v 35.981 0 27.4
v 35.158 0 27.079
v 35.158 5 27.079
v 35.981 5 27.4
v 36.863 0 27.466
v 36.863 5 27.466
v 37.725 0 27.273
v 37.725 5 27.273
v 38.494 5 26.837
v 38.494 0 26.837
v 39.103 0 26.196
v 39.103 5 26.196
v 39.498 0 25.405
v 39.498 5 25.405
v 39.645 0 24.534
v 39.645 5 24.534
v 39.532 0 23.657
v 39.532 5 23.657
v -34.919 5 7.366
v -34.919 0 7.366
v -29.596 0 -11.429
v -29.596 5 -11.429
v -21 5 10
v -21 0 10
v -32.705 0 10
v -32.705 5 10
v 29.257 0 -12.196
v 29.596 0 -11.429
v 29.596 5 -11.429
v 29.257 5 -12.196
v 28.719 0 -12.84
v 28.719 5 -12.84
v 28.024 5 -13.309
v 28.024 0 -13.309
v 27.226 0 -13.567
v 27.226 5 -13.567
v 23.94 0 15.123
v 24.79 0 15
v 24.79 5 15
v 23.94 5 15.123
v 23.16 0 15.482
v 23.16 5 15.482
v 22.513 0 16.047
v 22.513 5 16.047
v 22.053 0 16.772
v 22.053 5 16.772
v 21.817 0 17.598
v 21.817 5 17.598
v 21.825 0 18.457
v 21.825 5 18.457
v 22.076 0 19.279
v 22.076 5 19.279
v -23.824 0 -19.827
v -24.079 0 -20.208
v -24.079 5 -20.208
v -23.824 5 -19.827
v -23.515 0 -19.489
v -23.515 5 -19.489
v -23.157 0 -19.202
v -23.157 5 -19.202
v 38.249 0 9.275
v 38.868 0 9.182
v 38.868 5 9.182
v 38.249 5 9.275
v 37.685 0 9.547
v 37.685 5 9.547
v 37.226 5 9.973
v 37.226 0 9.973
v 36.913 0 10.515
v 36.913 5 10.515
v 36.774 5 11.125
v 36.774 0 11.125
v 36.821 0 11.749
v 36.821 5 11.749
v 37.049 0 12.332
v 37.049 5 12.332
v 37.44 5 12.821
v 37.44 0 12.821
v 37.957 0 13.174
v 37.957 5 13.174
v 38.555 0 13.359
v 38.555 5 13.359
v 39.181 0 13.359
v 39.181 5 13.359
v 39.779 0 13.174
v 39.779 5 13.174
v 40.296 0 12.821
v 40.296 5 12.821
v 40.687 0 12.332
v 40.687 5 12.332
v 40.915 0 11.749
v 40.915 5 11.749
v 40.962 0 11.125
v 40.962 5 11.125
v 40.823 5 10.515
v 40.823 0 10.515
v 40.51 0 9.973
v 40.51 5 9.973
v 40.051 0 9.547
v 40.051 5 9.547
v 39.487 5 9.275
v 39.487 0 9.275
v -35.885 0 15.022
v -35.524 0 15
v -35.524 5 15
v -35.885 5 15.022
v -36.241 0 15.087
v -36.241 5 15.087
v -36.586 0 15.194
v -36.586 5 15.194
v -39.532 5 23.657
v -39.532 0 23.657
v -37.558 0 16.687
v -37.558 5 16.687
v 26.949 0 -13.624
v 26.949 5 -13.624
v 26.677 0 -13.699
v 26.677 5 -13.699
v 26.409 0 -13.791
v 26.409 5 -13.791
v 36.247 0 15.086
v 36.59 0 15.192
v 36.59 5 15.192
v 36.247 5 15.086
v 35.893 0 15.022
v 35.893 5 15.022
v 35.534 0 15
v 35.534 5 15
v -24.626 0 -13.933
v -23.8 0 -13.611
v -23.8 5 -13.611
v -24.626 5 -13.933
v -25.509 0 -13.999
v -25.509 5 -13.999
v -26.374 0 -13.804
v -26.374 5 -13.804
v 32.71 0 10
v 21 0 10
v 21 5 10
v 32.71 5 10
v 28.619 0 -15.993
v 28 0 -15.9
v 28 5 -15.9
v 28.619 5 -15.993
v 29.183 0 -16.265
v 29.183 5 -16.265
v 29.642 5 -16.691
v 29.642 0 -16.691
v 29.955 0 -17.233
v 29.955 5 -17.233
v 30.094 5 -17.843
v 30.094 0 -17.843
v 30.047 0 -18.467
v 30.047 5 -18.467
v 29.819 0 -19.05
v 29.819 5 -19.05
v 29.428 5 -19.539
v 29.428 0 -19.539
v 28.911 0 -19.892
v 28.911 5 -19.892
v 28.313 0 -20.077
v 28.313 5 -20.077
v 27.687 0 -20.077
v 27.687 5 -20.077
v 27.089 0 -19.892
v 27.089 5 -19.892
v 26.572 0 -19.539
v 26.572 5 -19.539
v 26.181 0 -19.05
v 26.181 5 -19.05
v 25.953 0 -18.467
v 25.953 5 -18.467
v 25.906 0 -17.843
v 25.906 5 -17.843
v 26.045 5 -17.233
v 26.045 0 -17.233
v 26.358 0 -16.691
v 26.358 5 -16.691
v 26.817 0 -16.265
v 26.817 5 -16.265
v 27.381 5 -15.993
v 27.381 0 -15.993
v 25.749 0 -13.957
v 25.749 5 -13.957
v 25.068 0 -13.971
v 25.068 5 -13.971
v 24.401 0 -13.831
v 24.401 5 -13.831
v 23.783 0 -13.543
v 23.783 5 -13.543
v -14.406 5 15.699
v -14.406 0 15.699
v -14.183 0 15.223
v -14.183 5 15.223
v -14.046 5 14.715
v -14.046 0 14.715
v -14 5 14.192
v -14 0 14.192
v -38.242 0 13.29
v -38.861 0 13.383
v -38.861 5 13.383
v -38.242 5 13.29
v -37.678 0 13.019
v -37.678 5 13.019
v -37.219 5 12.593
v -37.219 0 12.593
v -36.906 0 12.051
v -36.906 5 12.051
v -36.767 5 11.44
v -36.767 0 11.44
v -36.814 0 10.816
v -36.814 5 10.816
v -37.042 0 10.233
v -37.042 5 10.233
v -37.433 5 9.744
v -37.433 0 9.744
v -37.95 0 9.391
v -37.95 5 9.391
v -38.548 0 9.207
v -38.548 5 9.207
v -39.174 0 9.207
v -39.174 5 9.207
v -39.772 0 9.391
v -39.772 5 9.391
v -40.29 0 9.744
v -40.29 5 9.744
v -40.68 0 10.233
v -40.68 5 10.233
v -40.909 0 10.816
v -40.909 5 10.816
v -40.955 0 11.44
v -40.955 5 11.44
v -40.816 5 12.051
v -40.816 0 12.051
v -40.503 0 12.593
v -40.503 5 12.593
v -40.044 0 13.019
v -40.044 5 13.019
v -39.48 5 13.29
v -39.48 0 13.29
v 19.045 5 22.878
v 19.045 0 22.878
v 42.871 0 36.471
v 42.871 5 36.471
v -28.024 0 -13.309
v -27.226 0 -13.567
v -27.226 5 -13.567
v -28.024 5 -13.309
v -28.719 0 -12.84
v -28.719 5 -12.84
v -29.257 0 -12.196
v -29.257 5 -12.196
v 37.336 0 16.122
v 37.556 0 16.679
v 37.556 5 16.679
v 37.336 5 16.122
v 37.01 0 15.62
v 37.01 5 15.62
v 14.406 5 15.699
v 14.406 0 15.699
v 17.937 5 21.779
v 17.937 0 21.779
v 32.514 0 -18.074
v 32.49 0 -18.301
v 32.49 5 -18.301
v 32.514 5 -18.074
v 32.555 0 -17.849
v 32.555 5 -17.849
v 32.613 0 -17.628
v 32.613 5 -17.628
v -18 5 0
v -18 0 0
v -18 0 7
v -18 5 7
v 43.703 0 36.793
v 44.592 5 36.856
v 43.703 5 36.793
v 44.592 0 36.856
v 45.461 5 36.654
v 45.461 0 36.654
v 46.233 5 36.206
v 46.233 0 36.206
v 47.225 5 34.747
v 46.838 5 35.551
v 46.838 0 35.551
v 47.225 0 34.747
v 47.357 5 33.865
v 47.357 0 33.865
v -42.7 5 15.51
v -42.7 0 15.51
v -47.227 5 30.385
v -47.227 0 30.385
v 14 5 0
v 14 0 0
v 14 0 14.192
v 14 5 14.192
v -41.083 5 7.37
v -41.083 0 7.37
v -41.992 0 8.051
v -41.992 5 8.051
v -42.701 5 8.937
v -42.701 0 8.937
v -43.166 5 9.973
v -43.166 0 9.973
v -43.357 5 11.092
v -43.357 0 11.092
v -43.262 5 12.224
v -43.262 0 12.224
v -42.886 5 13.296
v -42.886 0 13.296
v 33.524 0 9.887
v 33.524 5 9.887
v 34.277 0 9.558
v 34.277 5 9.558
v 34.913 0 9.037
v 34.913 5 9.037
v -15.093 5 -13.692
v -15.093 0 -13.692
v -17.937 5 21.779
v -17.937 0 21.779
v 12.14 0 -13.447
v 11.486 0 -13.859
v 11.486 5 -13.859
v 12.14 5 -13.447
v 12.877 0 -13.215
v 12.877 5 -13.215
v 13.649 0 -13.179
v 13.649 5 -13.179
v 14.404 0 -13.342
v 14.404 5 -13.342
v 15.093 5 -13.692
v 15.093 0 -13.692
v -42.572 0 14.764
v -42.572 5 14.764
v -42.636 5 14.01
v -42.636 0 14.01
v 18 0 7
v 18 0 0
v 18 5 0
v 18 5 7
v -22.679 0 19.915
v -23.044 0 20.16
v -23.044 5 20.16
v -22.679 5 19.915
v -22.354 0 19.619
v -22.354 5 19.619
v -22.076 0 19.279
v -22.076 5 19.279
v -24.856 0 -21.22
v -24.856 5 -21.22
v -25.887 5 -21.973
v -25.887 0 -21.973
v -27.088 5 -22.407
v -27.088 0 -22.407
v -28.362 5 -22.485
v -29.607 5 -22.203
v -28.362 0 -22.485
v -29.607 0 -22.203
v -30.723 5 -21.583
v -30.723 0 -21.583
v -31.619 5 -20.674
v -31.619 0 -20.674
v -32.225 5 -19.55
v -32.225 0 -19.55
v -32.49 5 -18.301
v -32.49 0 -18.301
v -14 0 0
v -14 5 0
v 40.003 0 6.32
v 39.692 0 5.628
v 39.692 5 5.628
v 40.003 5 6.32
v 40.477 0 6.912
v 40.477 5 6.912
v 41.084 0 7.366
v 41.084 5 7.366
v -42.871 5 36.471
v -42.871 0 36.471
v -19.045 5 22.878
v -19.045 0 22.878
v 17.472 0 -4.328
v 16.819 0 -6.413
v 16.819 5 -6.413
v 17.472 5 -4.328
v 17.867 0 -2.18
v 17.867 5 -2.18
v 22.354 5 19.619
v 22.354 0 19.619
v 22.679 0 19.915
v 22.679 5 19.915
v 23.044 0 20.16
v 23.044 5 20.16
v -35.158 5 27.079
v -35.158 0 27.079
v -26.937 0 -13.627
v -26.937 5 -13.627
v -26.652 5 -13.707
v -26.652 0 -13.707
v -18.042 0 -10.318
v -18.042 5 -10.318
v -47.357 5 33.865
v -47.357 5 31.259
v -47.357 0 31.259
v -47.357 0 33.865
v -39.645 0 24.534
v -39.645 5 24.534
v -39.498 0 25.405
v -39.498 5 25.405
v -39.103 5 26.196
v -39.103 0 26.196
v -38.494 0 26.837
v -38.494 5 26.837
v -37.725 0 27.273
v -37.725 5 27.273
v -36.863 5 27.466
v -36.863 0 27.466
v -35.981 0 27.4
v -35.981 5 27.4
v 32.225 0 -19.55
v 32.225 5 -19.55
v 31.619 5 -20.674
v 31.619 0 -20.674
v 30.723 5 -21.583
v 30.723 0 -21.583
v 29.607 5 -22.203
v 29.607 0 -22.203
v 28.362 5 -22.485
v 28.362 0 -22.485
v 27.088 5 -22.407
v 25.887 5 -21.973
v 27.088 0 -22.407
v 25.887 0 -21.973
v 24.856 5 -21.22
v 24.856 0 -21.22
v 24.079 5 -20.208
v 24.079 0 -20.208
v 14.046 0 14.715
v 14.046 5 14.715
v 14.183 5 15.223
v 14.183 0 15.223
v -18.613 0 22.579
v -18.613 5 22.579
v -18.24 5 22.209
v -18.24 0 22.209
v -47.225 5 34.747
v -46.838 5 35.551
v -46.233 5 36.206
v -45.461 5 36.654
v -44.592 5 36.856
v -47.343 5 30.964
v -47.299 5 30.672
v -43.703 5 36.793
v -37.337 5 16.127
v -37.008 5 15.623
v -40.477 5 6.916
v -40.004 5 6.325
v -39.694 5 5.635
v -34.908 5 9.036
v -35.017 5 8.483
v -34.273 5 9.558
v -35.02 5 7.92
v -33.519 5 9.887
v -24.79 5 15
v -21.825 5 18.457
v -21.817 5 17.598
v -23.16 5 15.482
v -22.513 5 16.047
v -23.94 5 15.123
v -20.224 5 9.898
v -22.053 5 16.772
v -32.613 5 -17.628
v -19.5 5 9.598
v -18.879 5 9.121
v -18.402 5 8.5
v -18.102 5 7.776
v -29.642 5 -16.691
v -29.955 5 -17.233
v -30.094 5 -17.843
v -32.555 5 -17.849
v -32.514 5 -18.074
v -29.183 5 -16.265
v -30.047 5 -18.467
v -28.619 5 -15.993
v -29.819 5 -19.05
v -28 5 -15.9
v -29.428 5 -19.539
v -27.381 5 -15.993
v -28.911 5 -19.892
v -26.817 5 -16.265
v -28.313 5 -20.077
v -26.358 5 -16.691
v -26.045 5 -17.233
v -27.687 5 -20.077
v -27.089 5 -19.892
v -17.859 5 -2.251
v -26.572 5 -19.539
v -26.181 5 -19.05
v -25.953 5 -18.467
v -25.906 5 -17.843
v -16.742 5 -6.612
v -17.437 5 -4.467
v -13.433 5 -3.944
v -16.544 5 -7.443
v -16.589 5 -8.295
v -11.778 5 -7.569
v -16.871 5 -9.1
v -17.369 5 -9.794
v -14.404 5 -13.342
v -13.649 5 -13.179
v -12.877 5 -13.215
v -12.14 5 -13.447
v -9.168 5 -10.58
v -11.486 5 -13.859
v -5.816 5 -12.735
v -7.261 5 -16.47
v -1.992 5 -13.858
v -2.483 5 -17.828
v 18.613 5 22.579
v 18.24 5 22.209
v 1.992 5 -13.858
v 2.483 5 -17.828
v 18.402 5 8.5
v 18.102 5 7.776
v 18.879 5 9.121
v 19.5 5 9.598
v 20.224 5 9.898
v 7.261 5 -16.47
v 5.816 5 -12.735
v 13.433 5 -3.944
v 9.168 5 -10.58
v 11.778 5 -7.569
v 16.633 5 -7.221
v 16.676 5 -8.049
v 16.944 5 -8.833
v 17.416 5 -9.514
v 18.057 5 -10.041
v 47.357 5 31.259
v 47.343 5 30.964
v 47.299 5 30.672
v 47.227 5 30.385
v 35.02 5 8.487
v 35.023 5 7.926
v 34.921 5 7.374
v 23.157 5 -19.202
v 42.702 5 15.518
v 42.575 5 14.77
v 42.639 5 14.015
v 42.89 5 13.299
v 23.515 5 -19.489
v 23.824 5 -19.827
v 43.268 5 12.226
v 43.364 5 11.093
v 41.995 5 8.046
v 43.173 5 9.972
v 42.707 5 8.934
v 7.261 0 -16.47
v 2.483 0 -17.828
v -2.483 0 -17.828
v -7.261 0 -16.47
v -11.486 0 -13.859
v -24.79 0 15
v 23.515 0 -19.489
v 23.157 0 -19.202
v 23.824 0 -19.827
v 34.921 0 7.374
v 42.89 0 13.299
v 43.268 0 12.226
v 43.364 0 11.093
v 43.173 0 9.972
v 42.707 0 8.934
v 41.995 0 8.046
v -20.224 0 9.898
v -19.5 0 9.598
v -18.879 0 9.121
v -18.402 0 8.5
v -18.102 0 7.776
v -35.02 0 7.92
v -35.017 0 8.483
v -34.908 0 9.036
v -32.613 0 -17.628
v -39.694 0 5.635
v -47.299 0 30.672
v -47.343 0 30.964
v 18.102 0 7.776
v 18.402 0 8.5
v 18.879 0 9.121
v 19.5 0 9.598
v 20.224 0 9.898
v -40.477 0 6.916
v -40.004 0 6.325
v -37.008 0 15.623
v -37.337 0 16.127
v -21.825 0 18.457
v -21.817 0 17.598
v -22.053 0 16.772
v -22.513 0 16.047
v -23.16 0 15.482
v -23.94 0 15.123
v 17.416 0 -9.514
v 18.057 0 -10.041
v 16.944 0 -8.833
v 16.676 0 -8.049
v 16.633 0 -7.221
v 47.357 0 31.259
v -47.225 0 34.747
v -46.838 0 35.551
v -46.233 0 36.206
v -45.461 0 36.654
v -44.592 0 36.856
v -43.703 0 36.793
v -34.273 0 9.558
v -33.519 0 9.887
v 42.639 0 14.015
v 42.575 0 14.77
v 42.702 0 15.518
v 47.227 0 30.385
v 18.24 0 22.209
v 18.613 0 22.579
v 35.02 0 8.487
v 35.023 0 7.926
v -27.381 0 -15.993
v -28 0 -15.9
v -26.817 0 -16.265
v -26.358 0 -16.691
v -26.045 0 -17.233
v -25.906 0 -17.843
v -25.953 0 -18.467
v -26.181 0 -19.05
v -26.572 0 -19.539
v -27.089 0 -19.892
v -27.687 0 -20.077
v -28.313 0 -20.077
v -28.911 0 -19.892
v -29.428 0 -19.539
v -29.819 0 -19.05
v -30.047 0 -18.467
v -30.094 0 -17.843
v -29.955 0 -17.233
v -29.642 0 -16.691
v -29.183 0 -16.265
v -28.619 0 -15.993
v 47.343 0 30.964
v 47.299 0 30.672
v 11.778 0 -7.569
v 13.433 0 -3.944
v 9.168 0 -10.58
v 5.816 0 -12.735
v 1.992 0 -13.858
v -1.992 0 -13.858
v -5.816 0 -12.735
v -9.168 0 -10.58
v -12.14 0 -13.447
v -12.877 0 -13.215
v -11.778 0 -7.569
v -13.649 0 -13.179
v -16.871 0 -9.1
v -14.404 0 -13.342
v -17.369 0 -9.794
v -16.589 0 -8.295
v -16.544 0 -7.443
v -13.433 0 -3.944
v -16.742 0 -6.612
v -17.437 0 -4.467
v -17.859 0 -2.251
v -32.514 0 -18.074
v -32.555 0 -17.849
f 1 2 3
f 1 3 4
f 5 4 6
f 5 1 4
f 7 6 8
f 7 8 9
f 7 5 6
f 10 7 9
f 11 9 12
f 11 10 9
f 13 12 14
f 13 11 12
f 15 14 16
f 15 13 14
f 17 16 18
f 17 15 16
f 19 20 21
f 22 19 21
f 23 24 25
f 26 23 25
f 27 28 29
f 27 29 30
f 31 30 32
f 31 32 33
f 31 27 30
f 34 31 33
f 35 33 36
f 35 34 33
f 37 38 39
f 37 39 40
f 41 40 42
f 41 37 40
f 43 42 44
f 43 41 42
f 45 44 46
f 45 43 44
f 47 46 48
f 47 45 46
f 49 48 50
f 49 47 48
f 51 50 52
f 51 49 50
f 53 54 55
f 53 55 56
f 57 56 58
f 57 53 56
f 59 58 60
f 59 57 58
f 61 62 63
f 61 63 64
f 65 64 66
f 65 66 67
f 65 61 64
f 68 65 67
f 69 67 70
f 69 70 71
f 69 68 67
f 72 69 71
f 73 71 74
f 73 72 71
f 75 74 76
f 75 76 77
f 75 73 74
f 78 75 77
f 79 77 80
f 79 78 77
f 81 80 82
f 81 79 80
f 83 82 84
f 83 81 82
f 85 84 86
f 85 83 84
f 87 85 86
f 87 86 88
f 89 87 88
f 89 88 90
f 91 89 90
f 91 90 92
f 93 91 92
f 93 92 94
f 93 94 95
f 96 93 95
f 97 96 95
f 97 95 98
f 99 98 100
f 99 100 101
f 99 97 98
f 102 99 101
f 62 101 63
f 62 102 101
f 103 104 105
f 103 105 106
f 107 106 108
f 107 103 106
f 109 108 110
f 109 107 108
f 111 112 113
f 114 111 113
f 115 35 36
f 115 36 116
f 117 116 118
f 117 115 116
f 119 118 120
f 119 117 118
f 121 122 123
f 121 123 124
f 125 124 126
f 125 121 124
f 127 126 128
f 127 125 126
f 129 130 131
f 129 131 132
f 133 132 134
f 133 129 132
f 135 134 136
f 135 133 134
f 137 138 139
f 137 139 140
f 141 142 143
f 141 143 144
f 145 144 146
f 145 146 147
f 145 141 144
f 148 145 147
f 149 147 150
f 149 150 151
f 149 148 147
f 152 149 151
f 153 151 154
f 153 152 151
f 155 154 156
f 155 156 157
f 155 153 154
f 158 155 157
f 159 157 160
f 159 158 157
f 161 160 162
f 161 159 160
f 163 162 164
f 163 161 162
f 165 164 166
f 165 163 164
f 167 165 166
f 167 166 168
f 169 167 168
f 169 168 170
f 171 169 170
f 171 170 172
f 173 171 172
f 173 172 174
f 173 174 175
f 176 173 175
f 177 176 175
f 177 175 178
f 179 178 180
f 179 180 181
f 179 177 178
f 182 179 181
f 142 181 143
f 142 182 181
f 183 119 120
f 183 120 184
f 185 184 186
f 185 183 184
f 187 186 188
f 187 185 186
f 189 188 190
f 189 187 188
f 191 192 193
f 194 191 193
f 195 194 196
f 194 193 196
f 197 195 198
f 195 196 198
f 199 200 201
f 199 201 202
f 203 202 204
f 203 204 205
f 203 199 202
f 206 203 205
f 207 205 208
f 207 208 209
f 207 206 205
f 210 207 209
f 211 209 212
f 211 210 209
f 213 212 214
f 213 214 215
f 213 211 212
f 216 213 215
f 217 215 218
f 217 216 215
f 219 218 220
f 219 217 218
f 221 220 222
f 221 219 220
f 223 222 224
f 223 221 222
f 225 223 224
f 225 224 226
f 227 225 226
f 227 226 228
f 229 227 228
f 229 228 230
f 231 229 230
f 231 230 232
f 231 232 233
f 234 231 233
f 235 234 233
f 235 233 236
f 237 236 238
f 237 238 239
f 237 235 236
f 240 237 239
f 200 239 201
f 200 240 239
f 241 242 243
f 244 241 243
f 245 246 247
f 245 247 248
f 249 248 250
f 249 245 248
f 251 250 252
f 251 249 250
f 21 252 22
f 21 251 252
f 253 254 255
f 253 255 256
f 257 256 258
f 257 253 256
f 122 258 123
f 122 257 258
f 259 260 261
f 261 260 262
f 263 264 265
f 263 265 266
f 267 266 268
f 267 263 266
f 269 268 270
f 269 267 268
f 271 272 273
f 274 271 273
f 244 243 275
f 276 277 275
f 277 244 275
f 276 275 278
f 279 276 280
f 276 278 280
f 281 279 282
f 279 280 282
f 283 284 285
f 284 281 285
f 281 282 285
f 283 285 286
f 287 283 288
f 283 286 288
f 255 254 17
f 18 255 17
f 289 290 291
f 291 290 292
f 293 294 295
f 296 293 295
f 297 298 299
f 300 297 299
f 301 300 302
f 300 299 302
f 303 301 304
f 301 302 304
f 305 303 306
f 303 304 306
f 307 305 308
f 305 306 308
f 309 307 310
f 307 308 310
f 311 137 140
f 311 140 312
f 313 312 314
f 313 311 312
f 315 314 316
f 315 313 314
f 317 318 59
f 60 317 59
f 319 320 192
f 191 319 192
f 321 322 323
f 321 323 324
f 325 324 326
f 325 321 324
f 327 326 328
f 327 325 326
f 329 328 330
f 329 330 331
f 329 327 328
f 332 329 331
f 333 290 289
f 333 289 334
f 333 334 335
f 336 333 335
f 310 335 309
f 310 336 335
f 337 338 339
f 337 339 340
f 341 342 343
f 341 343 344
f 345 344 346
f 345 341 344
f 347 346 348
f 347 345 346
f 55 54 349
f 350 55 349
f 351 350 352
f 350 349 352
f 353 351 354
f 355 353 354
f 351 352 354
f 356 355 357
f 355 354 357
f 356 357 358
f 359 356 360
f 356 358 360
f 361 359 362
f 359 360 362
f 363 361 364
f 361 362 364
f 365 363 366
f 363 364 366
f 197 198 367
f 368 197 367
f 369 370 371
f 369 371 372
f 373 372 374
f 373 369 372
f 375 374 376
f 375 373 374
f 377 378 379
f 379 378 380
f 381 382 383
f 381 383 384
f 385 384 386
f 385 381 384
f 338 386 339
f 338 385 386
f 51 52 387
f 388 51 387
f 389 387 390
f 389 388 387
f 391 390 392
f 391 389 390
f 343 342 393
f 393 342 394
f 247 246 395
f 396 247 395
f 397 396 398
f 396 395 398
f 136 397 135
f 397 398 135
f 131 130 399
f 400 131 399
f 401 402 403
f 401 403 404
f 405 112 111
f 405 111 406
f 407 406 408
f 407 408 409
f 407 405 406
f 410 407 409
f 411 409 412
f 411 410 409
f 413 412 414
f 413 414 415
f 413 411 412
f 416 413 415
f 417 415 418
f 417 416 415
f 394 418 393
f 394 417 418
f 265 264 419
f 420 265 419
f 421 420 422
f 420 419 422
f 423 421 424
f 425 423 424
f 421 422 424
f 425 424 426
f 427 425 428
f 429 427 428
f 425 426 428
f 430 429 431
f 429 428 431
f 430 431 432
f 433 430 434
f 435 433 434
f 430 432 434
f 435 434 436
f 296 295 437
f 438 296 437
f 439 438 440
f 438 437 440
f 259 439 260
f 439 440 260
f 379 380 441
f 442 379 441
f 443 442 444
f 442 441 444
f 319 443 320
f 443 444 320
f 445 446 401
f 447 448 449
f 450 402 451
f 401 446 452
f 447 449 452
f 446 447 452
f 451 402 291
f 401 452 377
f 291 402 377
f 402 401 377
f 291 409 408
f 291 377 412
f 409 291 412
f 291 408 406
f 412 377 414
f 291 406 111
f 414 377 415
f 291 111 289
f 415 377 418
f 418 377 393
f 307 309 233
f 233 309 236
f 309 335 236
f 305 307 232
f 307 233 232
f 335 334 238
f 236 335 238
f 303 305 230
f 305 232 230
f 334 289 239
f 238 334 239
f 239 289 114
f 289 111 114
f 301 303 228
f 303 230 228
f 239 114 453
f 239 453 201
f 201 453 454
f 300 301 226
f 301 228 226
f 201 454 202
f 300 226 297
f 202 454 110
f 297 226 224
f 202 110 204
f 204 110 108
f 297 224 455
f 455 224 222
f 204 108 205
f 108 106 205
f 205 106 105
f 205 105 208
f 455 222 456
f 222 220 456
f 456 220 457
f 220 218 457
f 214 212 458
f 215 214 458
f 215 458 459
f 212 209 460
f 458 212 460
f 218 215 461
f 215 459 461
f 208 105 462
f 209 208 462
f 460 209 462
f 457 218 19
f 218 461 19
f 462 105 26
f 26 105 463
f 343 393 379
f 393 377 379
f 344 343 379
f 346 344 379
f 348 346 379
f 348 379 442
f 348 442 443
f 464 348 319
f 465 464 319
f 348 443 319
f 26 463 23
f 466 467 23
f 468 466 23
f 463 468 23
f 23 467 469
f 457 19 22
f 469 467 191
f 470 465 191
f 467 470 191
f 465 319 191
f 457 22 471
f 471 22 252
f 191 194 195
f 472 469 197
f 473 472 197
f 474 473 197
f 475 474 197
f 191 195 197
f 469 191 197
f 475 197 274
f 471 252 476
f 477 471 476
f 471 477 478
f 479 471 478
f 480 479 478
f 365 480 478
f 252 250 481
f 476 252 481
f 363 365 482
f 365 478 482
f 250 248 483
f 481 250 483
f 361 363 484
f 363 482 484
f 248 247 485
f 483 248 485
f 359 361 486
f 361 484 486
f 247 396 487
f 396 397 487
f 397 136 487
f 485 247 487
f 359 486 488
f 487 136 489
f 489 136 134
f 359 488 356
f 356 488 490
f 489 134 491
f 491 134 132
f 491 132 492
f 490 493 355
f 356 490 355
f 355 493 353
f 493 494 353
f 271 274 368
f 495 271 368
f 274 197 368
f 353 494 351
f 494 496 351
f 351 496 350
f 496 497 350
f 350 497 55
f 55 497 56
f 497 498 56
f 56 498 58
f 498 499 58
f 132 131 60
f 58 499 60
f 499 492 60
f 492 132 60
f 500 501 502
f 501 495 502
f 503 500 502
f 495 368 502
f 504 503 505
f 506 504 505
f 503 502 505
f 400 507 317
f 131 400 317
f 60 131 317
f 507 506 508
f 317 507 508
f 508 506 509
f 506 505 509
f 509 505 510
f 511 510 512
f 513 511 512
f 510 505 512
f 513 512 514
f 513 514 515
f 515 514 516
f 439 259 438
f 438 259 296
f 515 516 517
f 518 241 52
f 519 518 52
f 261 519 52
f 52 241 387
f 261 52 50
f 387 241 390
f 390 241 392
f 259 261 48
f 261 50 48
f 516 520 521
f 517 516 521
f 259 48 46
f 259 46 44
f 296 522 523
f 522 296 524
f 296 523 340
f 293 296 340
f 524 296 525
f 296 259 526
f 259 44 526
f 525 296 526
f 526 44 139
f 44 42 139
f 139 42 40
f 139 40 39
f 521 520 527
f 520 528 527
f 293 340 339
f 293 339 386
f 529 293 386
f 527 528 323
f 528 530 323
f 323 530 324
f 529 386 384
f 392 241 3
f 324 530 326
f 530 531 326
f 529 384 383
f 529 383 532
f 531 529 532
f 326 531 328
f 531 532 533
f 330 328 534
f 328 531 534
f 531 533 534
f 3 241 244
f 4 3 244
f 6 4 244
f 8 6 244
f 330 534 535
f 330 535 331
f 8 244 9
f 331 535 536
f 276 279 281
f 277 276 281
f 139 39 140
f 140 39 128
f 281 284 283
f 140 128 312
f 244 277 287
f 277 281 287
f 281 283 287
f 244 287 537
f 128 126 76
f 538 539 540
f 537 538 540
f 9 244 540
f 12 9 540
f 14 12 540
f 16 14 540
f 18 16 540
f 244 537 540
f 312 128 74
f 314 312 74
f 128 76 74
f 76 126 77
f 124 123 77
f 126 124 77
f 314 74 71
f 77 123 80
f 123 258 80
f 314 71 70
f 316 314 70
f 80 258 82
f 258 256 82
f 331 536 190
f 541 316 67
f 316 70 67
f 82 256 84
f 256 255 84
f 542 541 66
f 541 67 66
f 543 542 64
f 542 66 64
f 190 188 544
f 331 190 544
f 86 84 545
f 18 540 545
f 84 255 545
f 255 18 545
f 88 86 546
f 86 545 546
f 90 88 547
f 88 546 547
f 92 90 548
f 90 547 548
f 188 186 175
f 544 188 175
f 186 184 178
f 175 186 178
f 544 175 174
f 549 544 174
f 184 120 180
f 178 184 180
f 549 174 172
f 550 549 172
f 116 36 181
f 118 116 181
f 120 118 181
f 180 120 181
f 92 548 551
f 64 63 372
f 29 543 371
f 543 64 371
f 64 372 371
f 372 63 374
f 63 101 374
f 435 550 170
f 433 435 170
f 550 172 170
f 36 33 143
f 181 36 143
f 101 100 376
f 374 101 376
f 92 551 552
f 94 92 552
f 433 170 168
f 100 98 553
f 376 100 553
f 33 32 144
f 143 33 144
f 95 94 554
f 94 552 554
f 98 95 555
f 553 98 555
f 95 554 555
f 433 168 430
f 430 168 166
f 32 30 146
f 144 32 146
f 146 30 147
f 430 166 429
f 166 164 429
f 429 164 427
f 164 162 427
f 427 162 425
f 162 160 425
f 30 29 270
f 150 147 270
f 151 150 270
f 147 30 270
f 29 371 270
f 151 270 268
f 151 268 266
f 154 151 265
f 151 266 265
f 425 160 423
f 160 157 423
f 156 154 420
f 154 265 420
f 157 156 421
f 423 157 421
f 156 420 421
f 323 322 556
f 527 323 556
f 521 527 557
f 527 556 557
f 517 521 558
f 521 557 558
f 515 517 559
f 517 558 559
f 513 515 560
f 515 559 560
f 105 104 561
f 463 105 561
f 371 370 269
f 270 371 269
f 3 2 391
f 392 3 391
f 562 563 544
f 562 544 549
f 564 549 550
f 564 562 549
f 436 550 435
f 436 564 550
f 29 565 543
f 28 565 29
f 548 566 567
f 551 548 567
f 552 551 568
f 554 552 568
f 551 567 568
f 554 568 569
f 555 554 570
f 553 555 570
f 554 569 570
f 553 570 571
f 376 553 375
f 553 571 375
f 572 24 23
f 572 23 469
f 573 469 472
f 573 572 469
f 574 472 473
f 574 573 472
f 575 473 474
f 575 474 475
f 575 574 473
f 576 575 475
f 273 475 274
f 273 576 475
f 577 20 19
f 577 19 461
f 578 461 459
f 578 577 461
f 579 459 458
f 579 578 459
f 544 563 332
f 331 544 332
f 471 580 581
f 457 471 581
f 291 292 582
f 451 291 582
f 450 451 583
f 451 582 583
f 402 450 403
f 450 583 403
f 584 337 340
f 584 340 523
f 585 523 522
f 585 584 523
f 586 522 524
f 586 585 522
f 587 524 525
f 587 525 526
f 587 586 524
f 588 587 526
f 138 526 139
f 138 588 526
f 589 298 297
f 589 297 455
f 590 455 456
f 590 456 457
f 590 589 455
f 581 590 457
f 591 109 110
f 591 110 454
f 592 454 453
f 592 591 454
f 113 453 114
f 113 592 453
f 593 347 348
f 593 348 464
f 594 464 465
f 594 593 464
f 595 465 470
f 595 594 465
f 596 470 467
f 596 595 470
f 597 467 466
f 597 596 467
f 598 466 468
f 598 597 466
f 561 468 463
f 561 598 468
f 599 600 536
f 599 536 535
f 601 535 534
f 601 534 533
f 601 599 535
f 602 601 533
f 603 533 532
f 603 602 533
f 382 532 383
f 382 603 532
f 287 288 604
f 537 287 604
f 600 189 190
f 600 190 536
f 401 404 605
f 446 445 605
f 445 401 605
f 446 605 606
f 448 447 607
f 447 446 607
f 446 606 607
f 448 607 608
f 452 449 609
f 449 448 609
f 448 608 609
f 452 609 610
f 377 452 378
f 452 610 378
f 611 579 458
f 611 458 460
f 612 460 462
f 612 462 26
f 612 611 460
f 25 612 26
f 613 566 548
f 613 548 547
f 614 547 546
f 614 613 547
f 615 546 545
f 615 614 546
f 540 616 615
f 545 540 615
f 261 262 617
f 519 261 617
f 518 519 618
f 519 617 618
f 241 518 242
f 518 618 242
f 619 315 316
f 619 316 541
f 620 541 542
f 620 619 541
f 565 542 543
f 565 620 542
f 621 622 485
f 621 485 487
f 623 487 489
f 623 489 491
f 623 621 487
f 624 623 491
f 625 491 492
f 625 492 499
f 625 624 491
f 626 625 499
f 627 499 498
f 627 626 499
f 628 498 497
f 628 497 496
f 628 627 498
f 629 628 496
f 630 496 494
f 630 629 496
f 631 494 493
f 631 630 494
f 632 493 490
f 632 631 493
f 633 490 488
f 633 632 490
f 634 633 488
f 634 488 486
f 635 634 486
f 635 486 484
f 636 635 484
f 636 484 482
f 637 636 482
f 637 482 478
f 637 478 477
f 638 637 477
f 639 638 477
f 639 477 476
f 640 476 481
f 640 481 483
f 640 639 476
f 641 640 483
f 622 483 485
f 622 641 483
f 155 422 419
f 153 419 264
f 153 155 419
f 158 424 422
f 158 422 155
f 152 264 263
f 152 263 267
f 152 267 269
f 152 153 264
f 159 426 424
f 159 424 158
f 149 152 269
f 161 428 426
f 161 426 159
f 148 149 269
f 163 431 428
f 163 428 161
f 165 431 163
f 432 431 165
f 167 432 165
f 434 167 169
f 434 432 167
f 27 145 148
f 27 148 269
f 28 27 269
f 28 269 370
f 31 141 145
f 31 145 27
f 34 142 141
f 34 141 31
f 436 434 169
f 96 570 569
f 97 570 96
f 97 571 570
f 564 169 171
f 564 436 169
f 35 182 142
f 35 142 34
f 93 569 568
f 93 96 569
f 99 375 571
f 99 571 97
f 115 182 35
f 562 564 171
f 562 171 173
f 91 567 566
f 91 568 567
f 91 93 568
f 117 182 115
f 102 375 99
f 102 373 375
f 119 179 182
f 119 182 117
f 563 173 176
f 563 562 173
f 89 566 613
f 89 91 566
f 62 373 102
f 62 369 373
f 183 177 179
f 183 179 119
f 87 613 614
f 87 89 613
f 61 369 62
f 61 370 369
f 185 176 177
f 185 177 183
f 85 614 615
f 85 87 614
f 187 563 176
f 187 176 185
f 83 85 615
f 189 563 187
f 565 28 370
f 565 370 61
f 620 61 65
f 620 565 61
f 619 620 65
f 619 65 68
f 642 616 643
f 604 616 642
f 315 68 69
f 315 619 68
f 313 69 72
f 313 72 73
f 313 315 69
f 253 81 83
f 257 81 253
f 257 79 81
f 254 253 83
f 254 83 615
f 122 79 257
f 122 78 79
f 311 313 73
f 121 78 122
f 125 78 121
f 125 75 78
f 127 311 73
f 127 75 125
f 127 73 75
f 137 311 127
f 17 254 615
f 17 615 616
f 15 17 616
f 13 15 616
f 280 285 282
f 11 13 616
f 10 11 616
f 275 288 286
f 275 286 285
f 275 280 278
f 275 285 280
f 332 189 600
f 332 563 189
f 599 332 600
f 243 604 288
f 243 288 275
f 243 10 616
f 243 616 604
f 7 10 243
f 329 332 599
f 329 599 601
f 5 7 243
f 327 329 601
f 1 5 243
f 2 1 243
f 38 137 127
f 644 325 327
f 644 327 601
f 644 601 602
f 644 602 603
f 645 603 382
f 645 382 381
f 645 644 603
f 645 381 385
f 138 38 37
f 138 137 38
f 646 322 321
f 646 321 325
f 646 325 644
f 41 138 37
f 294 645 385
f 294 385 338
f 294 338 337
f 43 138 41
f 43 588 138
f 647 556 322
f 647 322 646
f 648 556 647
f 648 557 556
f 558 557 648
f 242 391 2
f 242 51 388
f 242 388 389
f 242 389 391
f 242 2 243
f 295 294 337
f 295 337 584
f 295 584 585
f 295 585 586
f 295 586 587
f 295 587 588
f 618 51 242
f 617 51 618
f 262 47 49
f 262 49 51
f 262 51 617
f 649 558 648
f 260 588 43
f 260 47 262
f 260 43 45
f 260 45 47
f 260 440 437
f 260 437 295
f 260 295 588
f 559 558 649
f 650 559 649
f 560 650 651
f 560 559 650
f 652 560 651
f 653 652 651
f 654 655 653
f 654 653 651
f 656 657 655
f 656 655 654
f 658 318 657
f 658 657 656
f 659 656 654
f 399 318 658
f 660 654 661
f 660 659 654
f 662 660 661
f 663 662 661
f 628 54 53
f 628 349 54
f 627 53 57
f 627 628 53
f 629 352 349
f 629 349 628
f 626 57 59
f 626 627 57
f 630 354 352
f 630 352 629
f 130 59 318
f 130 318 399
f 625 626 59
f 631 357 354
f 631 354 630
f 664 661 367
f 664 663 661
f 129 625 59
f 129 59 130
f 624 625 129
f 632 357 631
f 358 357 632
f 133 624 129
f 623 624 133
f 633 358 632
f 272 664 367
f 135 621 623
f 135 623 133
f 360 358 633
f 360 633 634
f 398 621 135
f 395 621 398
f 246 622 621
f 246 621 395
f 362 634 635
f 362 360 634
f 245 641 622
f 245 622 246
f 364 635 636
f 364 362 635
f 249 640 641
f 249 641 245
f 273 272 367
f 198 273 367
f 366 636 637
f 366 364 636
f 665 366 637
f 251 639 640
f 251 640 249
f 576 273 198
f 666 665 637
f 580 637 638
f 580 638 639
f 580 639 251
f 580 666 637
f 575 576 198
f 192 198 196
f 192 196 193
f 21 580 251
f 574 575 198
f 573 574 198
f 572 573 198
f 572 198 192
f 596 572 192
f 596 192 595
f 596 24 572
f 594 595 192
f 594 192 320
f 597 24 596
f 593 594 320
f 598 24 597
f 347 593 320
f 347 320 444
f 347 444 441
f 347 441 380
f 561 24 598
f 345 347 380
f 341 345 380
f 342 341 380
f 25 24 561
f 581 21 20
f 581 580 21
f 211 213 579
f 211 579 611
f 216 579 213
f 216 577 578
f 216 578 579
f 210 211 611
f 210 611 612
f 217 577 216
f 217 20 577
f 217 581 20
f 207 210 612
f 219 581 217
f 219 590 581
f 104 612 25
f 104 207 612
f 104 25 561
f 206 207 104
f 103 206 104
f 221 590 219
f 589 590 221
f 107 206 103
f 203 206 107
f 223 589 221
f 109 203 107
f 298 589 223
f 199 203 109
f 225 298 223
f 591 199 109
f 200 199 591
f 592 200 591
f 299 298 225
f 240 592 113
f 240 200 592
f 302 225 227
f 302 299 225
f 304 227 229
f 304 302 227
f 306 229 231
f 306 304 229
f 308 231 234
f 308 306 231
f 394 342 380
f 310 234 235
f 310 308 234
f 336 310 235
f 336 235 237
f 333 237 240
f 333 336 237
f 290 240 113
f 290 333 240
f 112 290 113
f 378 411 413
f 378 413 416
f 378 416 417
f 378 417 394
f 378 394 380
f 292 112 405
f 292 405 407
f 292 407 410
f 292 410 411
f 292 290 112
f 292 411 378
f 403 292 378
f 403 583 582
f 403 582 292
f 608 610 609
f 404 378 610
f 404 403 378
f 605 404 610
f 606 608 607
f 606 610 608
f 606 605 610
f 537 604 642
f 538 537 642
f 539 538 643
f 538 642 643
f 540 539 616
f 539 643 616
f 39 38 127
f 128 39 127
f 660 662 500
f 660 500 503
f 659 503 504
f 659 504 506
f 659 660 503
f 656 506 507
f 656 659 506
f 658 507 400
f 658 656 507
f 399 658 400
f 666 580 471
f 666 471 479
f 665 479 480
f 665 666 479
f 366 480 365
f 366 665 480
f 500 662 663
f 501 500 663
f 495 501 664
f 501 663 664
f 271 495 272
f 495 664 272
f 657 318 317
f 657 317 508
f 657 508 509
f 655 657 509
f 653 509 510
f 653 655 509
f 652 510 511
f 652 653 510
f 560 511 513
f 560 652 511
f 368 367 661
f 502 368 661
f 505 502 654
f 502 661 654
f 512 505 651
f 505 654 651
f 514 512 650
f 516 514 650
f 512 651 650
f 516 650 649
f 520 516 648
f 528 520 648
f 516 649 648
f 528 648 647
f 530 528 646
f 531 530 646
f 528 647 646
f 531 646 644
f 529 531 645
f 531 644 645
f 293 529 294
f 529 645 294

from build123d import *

# Parameters (mm, degrees)
SKETCH1_R           = 2.1
BOSS_EXTRUDE1_DEPTH = 5
FILLET1_R           = 3


with BuildPart() as part:
    # Sketch1 → Boss-Extrude1 (new body)
    with BuildSketch(Plane(origin=(0, 0, 0), x_dir=(1, 0, 0), z_dir=(0, 1, 0))):
        with BuildLine():
            Line((-13.108424678, 12.335688164), (-23.81391613, 19.651272793))
            ThreePointArc((-23.81391613, 19.651272793), (-28.840423282, 22.420824437), (-32.5, 18))
            Line((-32.5, 18), (-40.096022742, -6.956210733))
            ThreePointArc((-40.096022742, -6.956210733), (-43.166154305, -9.97313073), (-42.297472679, -14.188923219))
            Line((-42.297472679, -14.188923219), (-47.357175059, -30.812227694))
            Line((-47.357175059, -30.812227694), (-47.357175059, -39.030363151))
            Line((-47.357175059, -39.030363151), (-18.342946516, -22.477663327))
            Line((-18.342946516, -22.477663327), (-14, -15))
            Line((-14, -15), (-14, 0))
            ThreePointArc((-14, 0), (0, 14), (14, 0))
            Line((14, 0), (14, -15))
            Line((14, -15), (18.342946516, -22.477663327))
            Line((18.342946516, -22.477663327), (47.357175059, -39.030363151))
            Line((47.357175059, -39.030363151), (47.357175059, -30.812227694))
            Line((47.357175059, -30.812227694), (42.298924547, -14.193693231))
            ThreePointArc((42.298924547, -14.193693231), (43.172910541, -9.971638801), (40.094885373, -6.952473984))
            Line((40.094885373, -6.952473984), (32.5, 18))
            ThreePointArc((32.5, 18), (28.840423282, 22.420824437), (23.81391613, 19.651272793))
            Line((23.81391613, 19.651272793), (13.108424678, 12.335688164))
            ThreePointArc((13.108424678, 12.335688164), (0, 18), (-13.108424678, 12.335688164))
        make_face()
        with Locations(Location((-28, 18, 0), (0, 0, 270))):
            Circle(SKETCH1_R, mode=Mode.SUBTRACT)
        with Locations(Location((28, 18, 0), (0, 0, 270))):
            Circle(SKETCH1_R, mode=Mode.SUBTRACT)
        with Locations(Location((-38.861153282, -11.283461294, 0), (0, 0, 270))):
            Circle(SKETCH1_R, mode=Mode.SUBTRACT)
        with Locations(Location((38.867909518, -11.281969365, 0), (0, 0, 90))):
            Circle(SKETCH1_R, mode=Mode.SUBTRACT)
        with BuildLine():
            Line((-25.248239149, 14.439408445), (-15.625218329, 8.936025525))
            ThreePointArc((-15.625218329, 8.936025525), (-17.396176734, 4.623097992), (-18, 0))
            Line((-18, 0), (-18, -10))
            Line((-18, -10), (-34.548065396, -10))
            ThreePointArc((-34.548065396, -10), (-34.842334147, -9.258839659), (-35.262806272, -8.581258711))
            Line((-35.262806272, -8.581258711), (-28.978960053, 13.607775368))
            ThreePointArc((-28.978960053, 13.607775368), (-27.02091417, 13.607803404), (-25.248239149, 14.439408445))
        make_face(mode=Mode.SUBTRACT)
        with BuildLine():
            Line((25.248239149, 14.439408445), (15.784829627, 8.650962585))
            ThreePointArc((15.784829627, 8.650962585), (17.43741571, 4.46503453), (18, 0))
            Line((18, 0), (18, -10))
            Line((18, -10), (34.554377954, -10))
            ThreePointArc((34.554377954, -10), (34.846788526, -9.261923334), (35.264352488, -8.586718591))
            Line((35.264352488, -8.586718591), (28.978960053, 13.607775368))
            ThreePointArc((28.978960053, 13.607775368), (27.02091417, 13.607803404), (25.248239149, 14.439408445))
        make_face(mode=Mode.SUBTRACT)
        with BuildLine():
            Line((-41.532552131, -30.720502684), (-37.214001281, -15.471168338))
            ThreePointArc((-37.214001281, -15.471168338), (-36.75575967, -15.260560455), (-36.323961913, -15))
            Line((-36.323961913, -15), (-19.578578595, -15))
            Line((-19.578578595, -15), (-22.342946516, -19.759674693))
            Line((-22.342946516, -19.759674693), (-41.532552131, -30.720502684))
        make_face(mode=Mode.SUBTRACT)
        with BuildLine():
            Line((22.342946516, -19.759674693), (19.578578595, -15))
            Line((19.578578595, -15), (36.332904943, -15))
            ThreePointArc((36.332904943, -15), (36.759847211, -15.257654628), (37.212676027, -15.466488703))
            Line((37.212676027, -15.466488703), (41.532552131, -30.720502684))
            Line((41.532552131, -30.720502684), (22.342946516, -19.759674693))
        make_face(mode=Mode.SUBTRACT)
    extrude(amount=BOSS_EXTRUDE1_DEPTH)

    # Fillet1
    # the kernel refuses this fillet: 3 mm, written as the material it adds along each edge
    with BuildSketch(Plane(origin=(-23.81391613, 0, -19.651272793), x_dir=(0.8256386968680198, 0, 0.5641992043897953), z_dir=(0, 1, 0))) as fillet1_piece_1:
        with BuildLine():
            CenterArc((0.795468008, 3), FILLET1_R, 243.725731212, 26.274268788)
            ThreePointArc((-0.532537609, 0.309944038), (-0.26095765, 0.164097503), (0, 0))
            Line((0, 0), (0.795468008, 0))
        make_face()
    extrude(amount=5)
    with BuildSketch(Plane(origin=(23.81391613, 0, -19.651272793), x_dir=(0.42977558669909965, 0, -0.9029357369588629), z_dir=(0, 1, 0))) as fillet1_piece_2:
        with BuildLine():
            CenterArc((0.821555826, 2.992960971), FILLET1_R, 239.800020252, 26.274268788)
            Line((-0.687503097, 0.400136032), (0, 0))
            ThreePointArc((0, 0), (0.308083435, 0.010558543), (0.61616687, 0))
        make_face()
    extrude(amount=5)
    with BuildSketch(Plane(origin=(-25.248239149, 0, -14.439408445), x_dir=(0.8680676849209873, 0, 0.496445862502567), z_dir=(0, 1, 0))) as fillet1_piece_3:
        with BuildLine():
            CenterArc((1.668323511, -3), FILLET1_R, 90, 50.952492326)
            ThreePointArc((-0.66154814, -1.110106329), (-0.290717482, -0.578924176), (0, 0))
            Line((0, 0), (1.668323511, 0))
        make_face()
    extrude(amount=5)
    with BuildSketch(Plane(origin=(25.248239149, 0, -14.439408445), x_dir=(0.872925185444734, 0, 0.4878540976729382), z_dir=(0, 1, 0))) as fillet1_piece_4:
        with BuildLine():
            CenterArc((1.773419123, -2.967058567), FILLET1_R, 98.498581583, 52.153761346)
            Line((-0.841566624, -1.496735629), (0, 0))
            ThreePointArc((0, 0), (0.665032171, -0.04941215), (1.330064343, 0))
        make_face()
    extrude(amount=5)
    with BuildSketch(Plane(origin=(15.784829627, 0, -8.650962585), x_dir=(0.41941825768343016, 0, 0.9077931070027994), z_dir=(0, 1, 0))) as fillet1_piece_5:
        with BuildLine():
            CenterArc((2.671150004, 2.992955198), FILLET1_R, 186.654842848, 79.417835827)
            Line((-0.308636879, 2.64529137), (0, 0))
            ThreePointArc((0, 0), (1.232838463, 0.042268815), (2.465676926, 0))
        make_face()
    extrude(amount=5)
    with BuildSketch(Plane(origin=(-15.625218329, 0, -8.936025525), x_dir=(-0.8680676849209876, 0, -0.4964458625025664), z_dir=(0, 1, 0))) as fillet1_piece_6:
        with BuildLine():
            CenterArc((2.784609691, 3), FILLET1_R, 188.213210702, 81.786789298)
            ThreePointArc((-0.184620265, 2.571428571), (-0.046214393, 1.289023811), (0, 0))
            Line((0, 0), (2.784609691, 0))
        make_face()
    extrude(amount=5)
    with BuildSketch(Plane(origin=(-22.342946516, 0, 19.759674693), x_dir=(0.5022287001852431, 0, -0.8647348337555515), z_dir=(0, 1, 0))) as fillet1_piece_7:
        with BuildLine():
            CenterArc((FILLET1_R * 0.269053653144, FILLET1_R), FILLET1_R, 239.881948801, 30.118051199)
            Line((-FILLET1_R * 0.232729627554, FILLET1_R * 0.135006624758), (0, 0))
            Line((0, 0), (FILLET1_R * 0.269053653144, 0))
        make_face()
    extrude(amount=5)
    with BuildSketch(Plane(origin=(-32.5, 0, -18), x_dir=(0.033460432753213476, 0, -0.9994400429440315), z_dir=(0, 1, 0))) as fillet1_piece_8:
        with BuildLine():
            CenterArc((0.401525193, 2.998320129), FILLET1_R, 254.988611701, 13.093888803)
            Line((-0.375507899, 0.100697038), (0, 0))
            ThreePointArc((0, 0), (0.150571947, 0.002519807), (0.301143895, 0))
        make_face()
    extrude(amount=5)
    with BuildSketch(Plane(origin=(-13.108424678, 0, -12.335688164), x_dir=(-0.8256386968680209, 0, -0.5641992043897939), z_dir=(0, 1, 0))) as fillet1_piece_9:
        with BuildLine():
            CenterArc((2.403694147, -3), FILLET1_R, 90, 73.99808624)
            ThreePointArc((-0.480063319, -2.172991611), (-0.206417918, -1.093921846), (0, 0))
            Line((0, 0), (2.403694147, 0))
        make_face()
    extrude(amount=5)
    with BuildSketch(Plane(origin=(13.108424678, 0, -12.335688164), x_dir=(0.8256386968680193, 0, -0.564199204389796), z_dir=(0, 1, 0))) as fillet1_piece_10:
        with BuildLine():
            CenterArc((2.403694147, 3), FILLET1_R, 196.00191376, 73.99808624)
            ThreePointArc((-0.480063319, 2.172991611), (-0.206417918, 1.093921846), (0, 0))
            Line((0, 0), (2.403694147, 0))
        make_face()
    extrude(amount=5)
    with BuildSketch(Plane(origin=(32.5, 0, -18), x_dir=(0.29118456974575907, 0, 0.9566668941392178), z_dir=(0, 1, 0))) as fillet1_piece_11:
        with BuildLine():
            CenterArc((0.388775096, 3), FILLET1_R, 256.906111197, 13.093888803)
            ThreePointArc((-0.290867168, 0.077999591), (-0.144780926, 0.041433612), (0, 0))
            Line((0, 0), (0.388775096, 0))
        make_face()
    extrude(amount=5)
    with BuildSketch(Plane(origin=(-28.978960053, 0, -13.607775368), x_dir=(-0.27248027384086115, 0, 0.9621613691931357), z_dir=(0, 1, 0))) as fillet1_piece_12:
        with BuildLine():
            CenterArc((2.264129599, 3), FILLET1_R, 205.720636607, 64.279363393)
            ThreePointArc((-0.438632708, 1.69804919), (-0.13579309, 0.870599963), (0, 0))
            Line((0, 0), (2.264129599, 0))
        make_face()
    extrude(amount=5)
    with BuildSketch(Plane(origin=(-18, 0, 10), x_dir=(0, 0, -1), z_dir=(0, 1, 0)), Plane(origin=(18, 0, 10), x_dir=(1, 0, 0), z_dir=(0, 1, 0))) as fillet1_piece_13:
        with BuildLine():
            CenterArc((FILLET1_R, FILLET1_R), FILLET1_R, 180, 90)
            Line((0, FILLET1_R), (0, 0))
            Line((0, 0), (FILLET1_R, 0))
        make_face()
    extrude(amount=5)
    with BuildSketch(Plane(origin=(19.578578595, 0, 15), x_dir=(0.5022287001852463, 0, 0.8647348337555496), z_dir=(0, 1, 0)), Plane(origin=(-19.578578595, 0, 15), x_dir=(-1, 0, 0), z_dir=(0, 1, 0))) as fillet1_piece_14:
        with BuildLine():
            CenterArc((FILLET1_R * 1.73721312192, FILLET1_R), FILLET1_R, 149.852440516, 120.147559484)
            Line((FILLET1_R * 0.872478288169, FILLET1_R * 1.50222870019), (0, 0))
            Line((0, 0), (FILLET1_R * 1.73721312192, 0))
        make_face()
    extrude(amount=5)
    with BuildSketch(Plane(origin=(28.978960053, 0, -13.607775368), x_dir=(-0.9997313516905528, 0, 0.02317810274764039), z_dir=(0, 1, 0))) as fillet1_piece_15:
        with BuildLine():
            CenterArc((2.338382994, 2.94249007), FILLET1_R, 194.483784652, 64.279363393)
            Line((-0.566272391, 2.192172078), (0, 0))
            ThreePointArc((0, 0), (0.876893623, 0.086264895), (1.753787246, 0))
        make_face()
    extrude(amount=5)
    with BuildSketch(Plane(origin=(-42.297472679, 0, 14.188923219), x_dir=(-0.550292568661387, 0, -0.8349719090341021), z_dir=(0, 1, 0))) as fillet1_piece_16:
        with BuildLine():
            CenterArc((1.426661501, 2.978722849), FILLET1_R, 219.684025488, 43.488017804)
            Line((-0.882071355, 1.063063015), (0, 0))
            ThreePointArc((0, 0), (0.534998063, 0.031915727), (1.069996126, 0))
        make_face()
    extrude(amount=5)
    with BuildSketch(Plane(origin=(-40.096022742, 0, 6.956210733), x_dir=(0.29118456974575413, 0, -0.9566668941392192), z_dir=(0, 1, 0))) as fillet1_piece_17:
        with BuildLine():
            CenterArc((1.381359058, 3), FILLET1_R, 226.511982196, 43.488017804)
            ThreePointArc((-0.683249534, 0.82344507), (-0.317063138, 0.432102427), (0, 0))
            Line((0, 0), (1.381359058, 0))
        make_face()
    extrude(amount=5)
    with BuildSketch(Plane(origin=(40.094885373, 0, 6.952473984), x_dir=(0.922776111721525, 0, 0.3853365381534742), z_dir=(0, 1, 0))) as fillet1_piece_18:
        with BuildLine():
            CenterArc((1.429570008, 2.978635694), FILLET1_R, 219.593522345, 43.564534449)
            Line((-0.8821859, 1.066625072), (0, 0))
            ThreePointArc((0, 0), (0.536088753, 0.032046458), (1.072177506, 0))
        make_face()
    extrude(amount=5)
    with BuildSketch(Plane(origin=(42.298924547, 0, 14.193693231), x_dir=(0.29118456974575607, 0, 0.9566668941392186), z_dir=(0, 1, 0))) as fillet1_piece_19:
        with BuildLine():
            CenterArc((1.384175208, 3), FILLET1_R, 226.435465551, 43.564534449)
            ThreePointArc((-0.68333826, 0.826204228), (-0.3169746, 0.433526504), (0, 0))
            Line((0, 0), (1.384175208, 0))
        make_face()
    extrude(amount=5)
    with BuildSketch(Plane(origin=(37.212676027, 0, 15.466488703), x_dir=(-0.884494678117859, 0, -0.4665502806570641), z_dir=(0, 1, 0))) as fillet1_piece_20:
        with BuildLine():
            CenterArc((1.301982556, 2.982289823), FILLET1_R, 223.622510824, 40.148718597)
            Line((-0.869720031, 0.912577796), (0, 0))
            ThreePointArc((0, 0), (0.488243459, 0.026565265), (0.976486917, 0))
        make_face()
    extrude(amount=5)
    with BuildSketch(Plane(origin=(36.332904943, 0, 15), x_dir=(-1, 0, 0), z_dir=(0, 1, 0))) as fillet1_piece_21:
        with BuildLine():
            CenterArc((0.799371586, 3), FILLET1_R, 243.603306461, 26.396693539)
            ThreePointArc((-0.534378878, 0.312787746), (-0.261803191, 0.165595952), (0, 0))
            Line((0, 0), (0.799371586, 0))
        make_face()
    extrude(amount=5)
    with BuildSketch(Plane(origin=(22.342946516, 0, 19.759674693), x_dir=(-0.5022287001852482, 0, -0.8647348337555484), z_dir=(0, 1, 0))) as fillet1_piece_22:
        with BuildLine():
            CenterArc((FILLET1_R * 0.269053653144, -FILLET1_R), FILLET1_R, 90, 30.118051199)
            Line((-FILLET1_R * 0.232729627554, -FILLET1_R * 0.135006624758), (0, 0))
            Line((0, 0), (FILLET1_R * 0.269053653144, 0))
        make_face()
    extrude(amount=5)
    with BuildSketch(Plane(origin=(41.532552131, 0, 30.720502684), x_dir=(-0.27248027384086354, 0, -0.9621613691931349), z_dir=(0, 1, 0))) as fillet1_piece_23:
        with BuildLine():
            CenterArc((FILLET1_R * 2.44714649084, FILLET1_R), FILLET1_R, 134.453699631, 135.546300369)
            Line((FILLET1_R * 1.74681382865, FILLET1_R * 1.7138166167), (0, 0))
            Line((0, 0), (FILLET1_R * 2.44714649084, 0))
        make_face()
    extrude(amount=5)
    with BuildSketch(Plane(origin=(34.554377954, 0, 10), x_dir=(0.4333984006716721, 0, -0.90120243358262), z_dir=(0, 1, 0))) as fillet1_piece_24:
        with BuildLine():
            CenterArc((1.904436719, 2.961979076), FILLET1_R, 205.683425336, 55.184949463)
            Line((-0.799170582, 1.661783874), (0, 0))
            ThreePointArc((0, 0), (0.714163769, 0.057031385), (1.428327539, 0))
        make_face()
    extrude(amount=5)
    with BuildSketch(Plane(origin=(35.264352488, 0, 8.586718591), x_dir=(-0.27248027384086226, 0, -0.9621613691931352), z_dir=(0, 1, 0))) as fillet1_piece_25:
        with BuildLine():
            CenterArc((1.260639189, 3), FILLET1_R, 229.851281403, 40.148718597)
            ThreePointArc((-0.673682239, 0.706879721), (-0.317610501, 0.371767344), (0, 0))
            Line((0, 0), (1.260639189, 0))
        make_face()
    extrude(amount=5)
    with BuildSketch(Plane(origin=(-35.262806272, 0, 8.581258711), x_dir=(0.509969050101938, 0, 0.8601927504566212), z_dir=(0, 1, 0))) as fillet1_piece_26:
        with BuildLine():
            CenterArc((1.304985241, 2.982207797), FILLET1_R, 223.526320741, 40.230486582)
            Line((-0.870188986, 0.916144613), (0, 0))
            ThreePointArc((0, 0), (0.489369465, 0.026688304), (0.978738931, 0))
        make_face()
    extrude(amount=5)
    with BuildSketch(Plane(origin=(-34.548065396, 0, 10), x_dir=(1, 0, 0), z_dir=(0, 1, 0))) as fillet1_piece_27:
        with BuildLine():
            CenterArc((1.843368835, 3), FILLET1_R, 214.828934175, 55.171065825)
            ThreePointArc((-0.619213853, 1.286615483), (-0.258250696, 0.668024131), (0, 0))
            Line((0, 0), (1.843368835, 0))
        make_face()
    extrude(amount=5)
    with BuildSketch(Plane(origin=(-36.323961913, 0, 15), x_dir=(-0.8627664666519094, 0, 0.5056026345075543), z_dir=(0, 1, 0))) as fillet1_piece_28:
        with BuildLine():
            CenterArc((0.826431657, 2.992877072), FILLET1_R, 239.628635242, 26.422318342)
            Line((-0.690376246, 0.404577672), (0, 0))
            ThreePointArc((0, 0), (0.309911872, 0.010684392), (0.619823743, 0))
        make_face()
    extrude(amount=5)
    with BuildSketch(Plane(origin=(-41.532552131, 0, 30.720502684), x_dir=(0.272480273840862, 0, -0.9621613691931352), z_dir=(0, 1, 0))) as fillet1_piece_29:
        with BuildLine():
            CenterArc((FILLET1_R * 2.44714649084, -FILLET1_R), FILLET1_R, 90, 135.546300369)
            Line((FILLET1_R * 1.74681382865, -FILLET1_R * 1.7138166167), (0, 0))
            Line((0, 0), (FILLET1_R * 2.44714649084, 0))
        make_face()
    extrude(amount=5)
    with BuildSketch(Plane(origin=(-37.214001281, 0, 15.471168338), x_dir=(-0.2724802738408629, 0, 0.9621613691931351), z_dir=(0, 1, 0))) as fillet1_piece_30:
        with BuildLine():
            CenterArc((1.263546526, 3), FILLET1_R, 229.769513418, 40.230486582)
            ThreePointArc((-0.67404549, 0.709642566), (-0.317672175, 0.37320119), (0, 0))
            Line((0, 0), (1.263546526, 0))
        make_face()
    extrude(amount=5)
    # the kernel refuses this fillet: 3 mm, written as the material it takes off along each edge
    with BuildSketch(Plane(origin=(47.357175059, -12.913462036, 39.030363151), x_dir=(-0.8685893031239024, 0, -0.4955326654204883), z_dir=(0, 1, 0)), Plane(origin=(-47.357175059, -12.913462036, 39.030363151), x_dir=(0, 0, -1), z_dir=(0, 1, 0))) as fillet1_2_piece_1:
        with BuildLine():
            CenterArc((FILLET1_R * 1.72179493812, -FILLET1_R), FILLET1_R, 90, 119.704881032)
            Line((FILLET1_R * 0.853205634992, -FILLET1_R * 1.49553266542), (0, 0))
            Line((0, 0), (FILLET1_R * 1.72179493812, 0))
        make_face()
    extrude(amount=30.826924072, mode=Mode.SUBTRACT)
    with BuildSketch(Plane(origin=(18.342946516, -2.019973662, 22.477663327), x_dir=(-0.5022287001852438, 0, -0.8647348337555512), z_dir=(0, 1, 0)), Plane(origin=(14, -2.019973662, 15), x_dir=(0, 0, -1), z_dir=(0, 1, 0)), Plane(origin=(-18.342946516, -2.019973662, 22.477663327), x_dir=(-0.8685893031239008, 0, 0.49553266542049107), z_dir=(0, 1, 0)), Plane(origin=(-14, -2.019973662, 15), x_dir=(-0.5022287001852443, 0, 0.8647348337555507), z_dir=(0, 1, 0))) as fillet1_2_piece_2:
        with BuildLine():
            CenterArc((FILLET1_R * 0.269329821642, -FILLET1_R), FILLET1_R, 90, 30.147559484)
            Line((-FILLET1_R * 0.232898878543, -FILLET1_R * 0.135265166244), (0, 0))
            Line((0, 0), (FILLET1_R * 0.269329821642, 0))
        make_face()
    extrude(amount=9.039947325, mode=Mode.SUBTRACT)
    with BuildSketch(Plane(origin=(47.357175059, -1.116124712, 30.812227694), x_dir=(0, 0, 1), z_dir=(0, 1, 0)), Plane(origin=(-47.357175059, -1.116124712, 30.812227694), x_dir=(0.29118456974575035, 0, -0.9566668941392203), z_dir=(0, 1, 0))) as fillet1_2_piece_3:
        with BuildLine():
            CenterArc((FILLET1_R * 0.148816628225, -FILLET1_R), FILLET1_R, 90, 16.928887796)
            Line((-FILLET1_R * 0.142367941521, -FILLET1_R * 0.0433331058608), (0, 0))
            Line((0, 0), (FILLET1_R * 0.148816628225, 0))
        make_face()
    extrude(amount=7.232249423, mode=Mode.SUBTRACT)


solid = part.part
